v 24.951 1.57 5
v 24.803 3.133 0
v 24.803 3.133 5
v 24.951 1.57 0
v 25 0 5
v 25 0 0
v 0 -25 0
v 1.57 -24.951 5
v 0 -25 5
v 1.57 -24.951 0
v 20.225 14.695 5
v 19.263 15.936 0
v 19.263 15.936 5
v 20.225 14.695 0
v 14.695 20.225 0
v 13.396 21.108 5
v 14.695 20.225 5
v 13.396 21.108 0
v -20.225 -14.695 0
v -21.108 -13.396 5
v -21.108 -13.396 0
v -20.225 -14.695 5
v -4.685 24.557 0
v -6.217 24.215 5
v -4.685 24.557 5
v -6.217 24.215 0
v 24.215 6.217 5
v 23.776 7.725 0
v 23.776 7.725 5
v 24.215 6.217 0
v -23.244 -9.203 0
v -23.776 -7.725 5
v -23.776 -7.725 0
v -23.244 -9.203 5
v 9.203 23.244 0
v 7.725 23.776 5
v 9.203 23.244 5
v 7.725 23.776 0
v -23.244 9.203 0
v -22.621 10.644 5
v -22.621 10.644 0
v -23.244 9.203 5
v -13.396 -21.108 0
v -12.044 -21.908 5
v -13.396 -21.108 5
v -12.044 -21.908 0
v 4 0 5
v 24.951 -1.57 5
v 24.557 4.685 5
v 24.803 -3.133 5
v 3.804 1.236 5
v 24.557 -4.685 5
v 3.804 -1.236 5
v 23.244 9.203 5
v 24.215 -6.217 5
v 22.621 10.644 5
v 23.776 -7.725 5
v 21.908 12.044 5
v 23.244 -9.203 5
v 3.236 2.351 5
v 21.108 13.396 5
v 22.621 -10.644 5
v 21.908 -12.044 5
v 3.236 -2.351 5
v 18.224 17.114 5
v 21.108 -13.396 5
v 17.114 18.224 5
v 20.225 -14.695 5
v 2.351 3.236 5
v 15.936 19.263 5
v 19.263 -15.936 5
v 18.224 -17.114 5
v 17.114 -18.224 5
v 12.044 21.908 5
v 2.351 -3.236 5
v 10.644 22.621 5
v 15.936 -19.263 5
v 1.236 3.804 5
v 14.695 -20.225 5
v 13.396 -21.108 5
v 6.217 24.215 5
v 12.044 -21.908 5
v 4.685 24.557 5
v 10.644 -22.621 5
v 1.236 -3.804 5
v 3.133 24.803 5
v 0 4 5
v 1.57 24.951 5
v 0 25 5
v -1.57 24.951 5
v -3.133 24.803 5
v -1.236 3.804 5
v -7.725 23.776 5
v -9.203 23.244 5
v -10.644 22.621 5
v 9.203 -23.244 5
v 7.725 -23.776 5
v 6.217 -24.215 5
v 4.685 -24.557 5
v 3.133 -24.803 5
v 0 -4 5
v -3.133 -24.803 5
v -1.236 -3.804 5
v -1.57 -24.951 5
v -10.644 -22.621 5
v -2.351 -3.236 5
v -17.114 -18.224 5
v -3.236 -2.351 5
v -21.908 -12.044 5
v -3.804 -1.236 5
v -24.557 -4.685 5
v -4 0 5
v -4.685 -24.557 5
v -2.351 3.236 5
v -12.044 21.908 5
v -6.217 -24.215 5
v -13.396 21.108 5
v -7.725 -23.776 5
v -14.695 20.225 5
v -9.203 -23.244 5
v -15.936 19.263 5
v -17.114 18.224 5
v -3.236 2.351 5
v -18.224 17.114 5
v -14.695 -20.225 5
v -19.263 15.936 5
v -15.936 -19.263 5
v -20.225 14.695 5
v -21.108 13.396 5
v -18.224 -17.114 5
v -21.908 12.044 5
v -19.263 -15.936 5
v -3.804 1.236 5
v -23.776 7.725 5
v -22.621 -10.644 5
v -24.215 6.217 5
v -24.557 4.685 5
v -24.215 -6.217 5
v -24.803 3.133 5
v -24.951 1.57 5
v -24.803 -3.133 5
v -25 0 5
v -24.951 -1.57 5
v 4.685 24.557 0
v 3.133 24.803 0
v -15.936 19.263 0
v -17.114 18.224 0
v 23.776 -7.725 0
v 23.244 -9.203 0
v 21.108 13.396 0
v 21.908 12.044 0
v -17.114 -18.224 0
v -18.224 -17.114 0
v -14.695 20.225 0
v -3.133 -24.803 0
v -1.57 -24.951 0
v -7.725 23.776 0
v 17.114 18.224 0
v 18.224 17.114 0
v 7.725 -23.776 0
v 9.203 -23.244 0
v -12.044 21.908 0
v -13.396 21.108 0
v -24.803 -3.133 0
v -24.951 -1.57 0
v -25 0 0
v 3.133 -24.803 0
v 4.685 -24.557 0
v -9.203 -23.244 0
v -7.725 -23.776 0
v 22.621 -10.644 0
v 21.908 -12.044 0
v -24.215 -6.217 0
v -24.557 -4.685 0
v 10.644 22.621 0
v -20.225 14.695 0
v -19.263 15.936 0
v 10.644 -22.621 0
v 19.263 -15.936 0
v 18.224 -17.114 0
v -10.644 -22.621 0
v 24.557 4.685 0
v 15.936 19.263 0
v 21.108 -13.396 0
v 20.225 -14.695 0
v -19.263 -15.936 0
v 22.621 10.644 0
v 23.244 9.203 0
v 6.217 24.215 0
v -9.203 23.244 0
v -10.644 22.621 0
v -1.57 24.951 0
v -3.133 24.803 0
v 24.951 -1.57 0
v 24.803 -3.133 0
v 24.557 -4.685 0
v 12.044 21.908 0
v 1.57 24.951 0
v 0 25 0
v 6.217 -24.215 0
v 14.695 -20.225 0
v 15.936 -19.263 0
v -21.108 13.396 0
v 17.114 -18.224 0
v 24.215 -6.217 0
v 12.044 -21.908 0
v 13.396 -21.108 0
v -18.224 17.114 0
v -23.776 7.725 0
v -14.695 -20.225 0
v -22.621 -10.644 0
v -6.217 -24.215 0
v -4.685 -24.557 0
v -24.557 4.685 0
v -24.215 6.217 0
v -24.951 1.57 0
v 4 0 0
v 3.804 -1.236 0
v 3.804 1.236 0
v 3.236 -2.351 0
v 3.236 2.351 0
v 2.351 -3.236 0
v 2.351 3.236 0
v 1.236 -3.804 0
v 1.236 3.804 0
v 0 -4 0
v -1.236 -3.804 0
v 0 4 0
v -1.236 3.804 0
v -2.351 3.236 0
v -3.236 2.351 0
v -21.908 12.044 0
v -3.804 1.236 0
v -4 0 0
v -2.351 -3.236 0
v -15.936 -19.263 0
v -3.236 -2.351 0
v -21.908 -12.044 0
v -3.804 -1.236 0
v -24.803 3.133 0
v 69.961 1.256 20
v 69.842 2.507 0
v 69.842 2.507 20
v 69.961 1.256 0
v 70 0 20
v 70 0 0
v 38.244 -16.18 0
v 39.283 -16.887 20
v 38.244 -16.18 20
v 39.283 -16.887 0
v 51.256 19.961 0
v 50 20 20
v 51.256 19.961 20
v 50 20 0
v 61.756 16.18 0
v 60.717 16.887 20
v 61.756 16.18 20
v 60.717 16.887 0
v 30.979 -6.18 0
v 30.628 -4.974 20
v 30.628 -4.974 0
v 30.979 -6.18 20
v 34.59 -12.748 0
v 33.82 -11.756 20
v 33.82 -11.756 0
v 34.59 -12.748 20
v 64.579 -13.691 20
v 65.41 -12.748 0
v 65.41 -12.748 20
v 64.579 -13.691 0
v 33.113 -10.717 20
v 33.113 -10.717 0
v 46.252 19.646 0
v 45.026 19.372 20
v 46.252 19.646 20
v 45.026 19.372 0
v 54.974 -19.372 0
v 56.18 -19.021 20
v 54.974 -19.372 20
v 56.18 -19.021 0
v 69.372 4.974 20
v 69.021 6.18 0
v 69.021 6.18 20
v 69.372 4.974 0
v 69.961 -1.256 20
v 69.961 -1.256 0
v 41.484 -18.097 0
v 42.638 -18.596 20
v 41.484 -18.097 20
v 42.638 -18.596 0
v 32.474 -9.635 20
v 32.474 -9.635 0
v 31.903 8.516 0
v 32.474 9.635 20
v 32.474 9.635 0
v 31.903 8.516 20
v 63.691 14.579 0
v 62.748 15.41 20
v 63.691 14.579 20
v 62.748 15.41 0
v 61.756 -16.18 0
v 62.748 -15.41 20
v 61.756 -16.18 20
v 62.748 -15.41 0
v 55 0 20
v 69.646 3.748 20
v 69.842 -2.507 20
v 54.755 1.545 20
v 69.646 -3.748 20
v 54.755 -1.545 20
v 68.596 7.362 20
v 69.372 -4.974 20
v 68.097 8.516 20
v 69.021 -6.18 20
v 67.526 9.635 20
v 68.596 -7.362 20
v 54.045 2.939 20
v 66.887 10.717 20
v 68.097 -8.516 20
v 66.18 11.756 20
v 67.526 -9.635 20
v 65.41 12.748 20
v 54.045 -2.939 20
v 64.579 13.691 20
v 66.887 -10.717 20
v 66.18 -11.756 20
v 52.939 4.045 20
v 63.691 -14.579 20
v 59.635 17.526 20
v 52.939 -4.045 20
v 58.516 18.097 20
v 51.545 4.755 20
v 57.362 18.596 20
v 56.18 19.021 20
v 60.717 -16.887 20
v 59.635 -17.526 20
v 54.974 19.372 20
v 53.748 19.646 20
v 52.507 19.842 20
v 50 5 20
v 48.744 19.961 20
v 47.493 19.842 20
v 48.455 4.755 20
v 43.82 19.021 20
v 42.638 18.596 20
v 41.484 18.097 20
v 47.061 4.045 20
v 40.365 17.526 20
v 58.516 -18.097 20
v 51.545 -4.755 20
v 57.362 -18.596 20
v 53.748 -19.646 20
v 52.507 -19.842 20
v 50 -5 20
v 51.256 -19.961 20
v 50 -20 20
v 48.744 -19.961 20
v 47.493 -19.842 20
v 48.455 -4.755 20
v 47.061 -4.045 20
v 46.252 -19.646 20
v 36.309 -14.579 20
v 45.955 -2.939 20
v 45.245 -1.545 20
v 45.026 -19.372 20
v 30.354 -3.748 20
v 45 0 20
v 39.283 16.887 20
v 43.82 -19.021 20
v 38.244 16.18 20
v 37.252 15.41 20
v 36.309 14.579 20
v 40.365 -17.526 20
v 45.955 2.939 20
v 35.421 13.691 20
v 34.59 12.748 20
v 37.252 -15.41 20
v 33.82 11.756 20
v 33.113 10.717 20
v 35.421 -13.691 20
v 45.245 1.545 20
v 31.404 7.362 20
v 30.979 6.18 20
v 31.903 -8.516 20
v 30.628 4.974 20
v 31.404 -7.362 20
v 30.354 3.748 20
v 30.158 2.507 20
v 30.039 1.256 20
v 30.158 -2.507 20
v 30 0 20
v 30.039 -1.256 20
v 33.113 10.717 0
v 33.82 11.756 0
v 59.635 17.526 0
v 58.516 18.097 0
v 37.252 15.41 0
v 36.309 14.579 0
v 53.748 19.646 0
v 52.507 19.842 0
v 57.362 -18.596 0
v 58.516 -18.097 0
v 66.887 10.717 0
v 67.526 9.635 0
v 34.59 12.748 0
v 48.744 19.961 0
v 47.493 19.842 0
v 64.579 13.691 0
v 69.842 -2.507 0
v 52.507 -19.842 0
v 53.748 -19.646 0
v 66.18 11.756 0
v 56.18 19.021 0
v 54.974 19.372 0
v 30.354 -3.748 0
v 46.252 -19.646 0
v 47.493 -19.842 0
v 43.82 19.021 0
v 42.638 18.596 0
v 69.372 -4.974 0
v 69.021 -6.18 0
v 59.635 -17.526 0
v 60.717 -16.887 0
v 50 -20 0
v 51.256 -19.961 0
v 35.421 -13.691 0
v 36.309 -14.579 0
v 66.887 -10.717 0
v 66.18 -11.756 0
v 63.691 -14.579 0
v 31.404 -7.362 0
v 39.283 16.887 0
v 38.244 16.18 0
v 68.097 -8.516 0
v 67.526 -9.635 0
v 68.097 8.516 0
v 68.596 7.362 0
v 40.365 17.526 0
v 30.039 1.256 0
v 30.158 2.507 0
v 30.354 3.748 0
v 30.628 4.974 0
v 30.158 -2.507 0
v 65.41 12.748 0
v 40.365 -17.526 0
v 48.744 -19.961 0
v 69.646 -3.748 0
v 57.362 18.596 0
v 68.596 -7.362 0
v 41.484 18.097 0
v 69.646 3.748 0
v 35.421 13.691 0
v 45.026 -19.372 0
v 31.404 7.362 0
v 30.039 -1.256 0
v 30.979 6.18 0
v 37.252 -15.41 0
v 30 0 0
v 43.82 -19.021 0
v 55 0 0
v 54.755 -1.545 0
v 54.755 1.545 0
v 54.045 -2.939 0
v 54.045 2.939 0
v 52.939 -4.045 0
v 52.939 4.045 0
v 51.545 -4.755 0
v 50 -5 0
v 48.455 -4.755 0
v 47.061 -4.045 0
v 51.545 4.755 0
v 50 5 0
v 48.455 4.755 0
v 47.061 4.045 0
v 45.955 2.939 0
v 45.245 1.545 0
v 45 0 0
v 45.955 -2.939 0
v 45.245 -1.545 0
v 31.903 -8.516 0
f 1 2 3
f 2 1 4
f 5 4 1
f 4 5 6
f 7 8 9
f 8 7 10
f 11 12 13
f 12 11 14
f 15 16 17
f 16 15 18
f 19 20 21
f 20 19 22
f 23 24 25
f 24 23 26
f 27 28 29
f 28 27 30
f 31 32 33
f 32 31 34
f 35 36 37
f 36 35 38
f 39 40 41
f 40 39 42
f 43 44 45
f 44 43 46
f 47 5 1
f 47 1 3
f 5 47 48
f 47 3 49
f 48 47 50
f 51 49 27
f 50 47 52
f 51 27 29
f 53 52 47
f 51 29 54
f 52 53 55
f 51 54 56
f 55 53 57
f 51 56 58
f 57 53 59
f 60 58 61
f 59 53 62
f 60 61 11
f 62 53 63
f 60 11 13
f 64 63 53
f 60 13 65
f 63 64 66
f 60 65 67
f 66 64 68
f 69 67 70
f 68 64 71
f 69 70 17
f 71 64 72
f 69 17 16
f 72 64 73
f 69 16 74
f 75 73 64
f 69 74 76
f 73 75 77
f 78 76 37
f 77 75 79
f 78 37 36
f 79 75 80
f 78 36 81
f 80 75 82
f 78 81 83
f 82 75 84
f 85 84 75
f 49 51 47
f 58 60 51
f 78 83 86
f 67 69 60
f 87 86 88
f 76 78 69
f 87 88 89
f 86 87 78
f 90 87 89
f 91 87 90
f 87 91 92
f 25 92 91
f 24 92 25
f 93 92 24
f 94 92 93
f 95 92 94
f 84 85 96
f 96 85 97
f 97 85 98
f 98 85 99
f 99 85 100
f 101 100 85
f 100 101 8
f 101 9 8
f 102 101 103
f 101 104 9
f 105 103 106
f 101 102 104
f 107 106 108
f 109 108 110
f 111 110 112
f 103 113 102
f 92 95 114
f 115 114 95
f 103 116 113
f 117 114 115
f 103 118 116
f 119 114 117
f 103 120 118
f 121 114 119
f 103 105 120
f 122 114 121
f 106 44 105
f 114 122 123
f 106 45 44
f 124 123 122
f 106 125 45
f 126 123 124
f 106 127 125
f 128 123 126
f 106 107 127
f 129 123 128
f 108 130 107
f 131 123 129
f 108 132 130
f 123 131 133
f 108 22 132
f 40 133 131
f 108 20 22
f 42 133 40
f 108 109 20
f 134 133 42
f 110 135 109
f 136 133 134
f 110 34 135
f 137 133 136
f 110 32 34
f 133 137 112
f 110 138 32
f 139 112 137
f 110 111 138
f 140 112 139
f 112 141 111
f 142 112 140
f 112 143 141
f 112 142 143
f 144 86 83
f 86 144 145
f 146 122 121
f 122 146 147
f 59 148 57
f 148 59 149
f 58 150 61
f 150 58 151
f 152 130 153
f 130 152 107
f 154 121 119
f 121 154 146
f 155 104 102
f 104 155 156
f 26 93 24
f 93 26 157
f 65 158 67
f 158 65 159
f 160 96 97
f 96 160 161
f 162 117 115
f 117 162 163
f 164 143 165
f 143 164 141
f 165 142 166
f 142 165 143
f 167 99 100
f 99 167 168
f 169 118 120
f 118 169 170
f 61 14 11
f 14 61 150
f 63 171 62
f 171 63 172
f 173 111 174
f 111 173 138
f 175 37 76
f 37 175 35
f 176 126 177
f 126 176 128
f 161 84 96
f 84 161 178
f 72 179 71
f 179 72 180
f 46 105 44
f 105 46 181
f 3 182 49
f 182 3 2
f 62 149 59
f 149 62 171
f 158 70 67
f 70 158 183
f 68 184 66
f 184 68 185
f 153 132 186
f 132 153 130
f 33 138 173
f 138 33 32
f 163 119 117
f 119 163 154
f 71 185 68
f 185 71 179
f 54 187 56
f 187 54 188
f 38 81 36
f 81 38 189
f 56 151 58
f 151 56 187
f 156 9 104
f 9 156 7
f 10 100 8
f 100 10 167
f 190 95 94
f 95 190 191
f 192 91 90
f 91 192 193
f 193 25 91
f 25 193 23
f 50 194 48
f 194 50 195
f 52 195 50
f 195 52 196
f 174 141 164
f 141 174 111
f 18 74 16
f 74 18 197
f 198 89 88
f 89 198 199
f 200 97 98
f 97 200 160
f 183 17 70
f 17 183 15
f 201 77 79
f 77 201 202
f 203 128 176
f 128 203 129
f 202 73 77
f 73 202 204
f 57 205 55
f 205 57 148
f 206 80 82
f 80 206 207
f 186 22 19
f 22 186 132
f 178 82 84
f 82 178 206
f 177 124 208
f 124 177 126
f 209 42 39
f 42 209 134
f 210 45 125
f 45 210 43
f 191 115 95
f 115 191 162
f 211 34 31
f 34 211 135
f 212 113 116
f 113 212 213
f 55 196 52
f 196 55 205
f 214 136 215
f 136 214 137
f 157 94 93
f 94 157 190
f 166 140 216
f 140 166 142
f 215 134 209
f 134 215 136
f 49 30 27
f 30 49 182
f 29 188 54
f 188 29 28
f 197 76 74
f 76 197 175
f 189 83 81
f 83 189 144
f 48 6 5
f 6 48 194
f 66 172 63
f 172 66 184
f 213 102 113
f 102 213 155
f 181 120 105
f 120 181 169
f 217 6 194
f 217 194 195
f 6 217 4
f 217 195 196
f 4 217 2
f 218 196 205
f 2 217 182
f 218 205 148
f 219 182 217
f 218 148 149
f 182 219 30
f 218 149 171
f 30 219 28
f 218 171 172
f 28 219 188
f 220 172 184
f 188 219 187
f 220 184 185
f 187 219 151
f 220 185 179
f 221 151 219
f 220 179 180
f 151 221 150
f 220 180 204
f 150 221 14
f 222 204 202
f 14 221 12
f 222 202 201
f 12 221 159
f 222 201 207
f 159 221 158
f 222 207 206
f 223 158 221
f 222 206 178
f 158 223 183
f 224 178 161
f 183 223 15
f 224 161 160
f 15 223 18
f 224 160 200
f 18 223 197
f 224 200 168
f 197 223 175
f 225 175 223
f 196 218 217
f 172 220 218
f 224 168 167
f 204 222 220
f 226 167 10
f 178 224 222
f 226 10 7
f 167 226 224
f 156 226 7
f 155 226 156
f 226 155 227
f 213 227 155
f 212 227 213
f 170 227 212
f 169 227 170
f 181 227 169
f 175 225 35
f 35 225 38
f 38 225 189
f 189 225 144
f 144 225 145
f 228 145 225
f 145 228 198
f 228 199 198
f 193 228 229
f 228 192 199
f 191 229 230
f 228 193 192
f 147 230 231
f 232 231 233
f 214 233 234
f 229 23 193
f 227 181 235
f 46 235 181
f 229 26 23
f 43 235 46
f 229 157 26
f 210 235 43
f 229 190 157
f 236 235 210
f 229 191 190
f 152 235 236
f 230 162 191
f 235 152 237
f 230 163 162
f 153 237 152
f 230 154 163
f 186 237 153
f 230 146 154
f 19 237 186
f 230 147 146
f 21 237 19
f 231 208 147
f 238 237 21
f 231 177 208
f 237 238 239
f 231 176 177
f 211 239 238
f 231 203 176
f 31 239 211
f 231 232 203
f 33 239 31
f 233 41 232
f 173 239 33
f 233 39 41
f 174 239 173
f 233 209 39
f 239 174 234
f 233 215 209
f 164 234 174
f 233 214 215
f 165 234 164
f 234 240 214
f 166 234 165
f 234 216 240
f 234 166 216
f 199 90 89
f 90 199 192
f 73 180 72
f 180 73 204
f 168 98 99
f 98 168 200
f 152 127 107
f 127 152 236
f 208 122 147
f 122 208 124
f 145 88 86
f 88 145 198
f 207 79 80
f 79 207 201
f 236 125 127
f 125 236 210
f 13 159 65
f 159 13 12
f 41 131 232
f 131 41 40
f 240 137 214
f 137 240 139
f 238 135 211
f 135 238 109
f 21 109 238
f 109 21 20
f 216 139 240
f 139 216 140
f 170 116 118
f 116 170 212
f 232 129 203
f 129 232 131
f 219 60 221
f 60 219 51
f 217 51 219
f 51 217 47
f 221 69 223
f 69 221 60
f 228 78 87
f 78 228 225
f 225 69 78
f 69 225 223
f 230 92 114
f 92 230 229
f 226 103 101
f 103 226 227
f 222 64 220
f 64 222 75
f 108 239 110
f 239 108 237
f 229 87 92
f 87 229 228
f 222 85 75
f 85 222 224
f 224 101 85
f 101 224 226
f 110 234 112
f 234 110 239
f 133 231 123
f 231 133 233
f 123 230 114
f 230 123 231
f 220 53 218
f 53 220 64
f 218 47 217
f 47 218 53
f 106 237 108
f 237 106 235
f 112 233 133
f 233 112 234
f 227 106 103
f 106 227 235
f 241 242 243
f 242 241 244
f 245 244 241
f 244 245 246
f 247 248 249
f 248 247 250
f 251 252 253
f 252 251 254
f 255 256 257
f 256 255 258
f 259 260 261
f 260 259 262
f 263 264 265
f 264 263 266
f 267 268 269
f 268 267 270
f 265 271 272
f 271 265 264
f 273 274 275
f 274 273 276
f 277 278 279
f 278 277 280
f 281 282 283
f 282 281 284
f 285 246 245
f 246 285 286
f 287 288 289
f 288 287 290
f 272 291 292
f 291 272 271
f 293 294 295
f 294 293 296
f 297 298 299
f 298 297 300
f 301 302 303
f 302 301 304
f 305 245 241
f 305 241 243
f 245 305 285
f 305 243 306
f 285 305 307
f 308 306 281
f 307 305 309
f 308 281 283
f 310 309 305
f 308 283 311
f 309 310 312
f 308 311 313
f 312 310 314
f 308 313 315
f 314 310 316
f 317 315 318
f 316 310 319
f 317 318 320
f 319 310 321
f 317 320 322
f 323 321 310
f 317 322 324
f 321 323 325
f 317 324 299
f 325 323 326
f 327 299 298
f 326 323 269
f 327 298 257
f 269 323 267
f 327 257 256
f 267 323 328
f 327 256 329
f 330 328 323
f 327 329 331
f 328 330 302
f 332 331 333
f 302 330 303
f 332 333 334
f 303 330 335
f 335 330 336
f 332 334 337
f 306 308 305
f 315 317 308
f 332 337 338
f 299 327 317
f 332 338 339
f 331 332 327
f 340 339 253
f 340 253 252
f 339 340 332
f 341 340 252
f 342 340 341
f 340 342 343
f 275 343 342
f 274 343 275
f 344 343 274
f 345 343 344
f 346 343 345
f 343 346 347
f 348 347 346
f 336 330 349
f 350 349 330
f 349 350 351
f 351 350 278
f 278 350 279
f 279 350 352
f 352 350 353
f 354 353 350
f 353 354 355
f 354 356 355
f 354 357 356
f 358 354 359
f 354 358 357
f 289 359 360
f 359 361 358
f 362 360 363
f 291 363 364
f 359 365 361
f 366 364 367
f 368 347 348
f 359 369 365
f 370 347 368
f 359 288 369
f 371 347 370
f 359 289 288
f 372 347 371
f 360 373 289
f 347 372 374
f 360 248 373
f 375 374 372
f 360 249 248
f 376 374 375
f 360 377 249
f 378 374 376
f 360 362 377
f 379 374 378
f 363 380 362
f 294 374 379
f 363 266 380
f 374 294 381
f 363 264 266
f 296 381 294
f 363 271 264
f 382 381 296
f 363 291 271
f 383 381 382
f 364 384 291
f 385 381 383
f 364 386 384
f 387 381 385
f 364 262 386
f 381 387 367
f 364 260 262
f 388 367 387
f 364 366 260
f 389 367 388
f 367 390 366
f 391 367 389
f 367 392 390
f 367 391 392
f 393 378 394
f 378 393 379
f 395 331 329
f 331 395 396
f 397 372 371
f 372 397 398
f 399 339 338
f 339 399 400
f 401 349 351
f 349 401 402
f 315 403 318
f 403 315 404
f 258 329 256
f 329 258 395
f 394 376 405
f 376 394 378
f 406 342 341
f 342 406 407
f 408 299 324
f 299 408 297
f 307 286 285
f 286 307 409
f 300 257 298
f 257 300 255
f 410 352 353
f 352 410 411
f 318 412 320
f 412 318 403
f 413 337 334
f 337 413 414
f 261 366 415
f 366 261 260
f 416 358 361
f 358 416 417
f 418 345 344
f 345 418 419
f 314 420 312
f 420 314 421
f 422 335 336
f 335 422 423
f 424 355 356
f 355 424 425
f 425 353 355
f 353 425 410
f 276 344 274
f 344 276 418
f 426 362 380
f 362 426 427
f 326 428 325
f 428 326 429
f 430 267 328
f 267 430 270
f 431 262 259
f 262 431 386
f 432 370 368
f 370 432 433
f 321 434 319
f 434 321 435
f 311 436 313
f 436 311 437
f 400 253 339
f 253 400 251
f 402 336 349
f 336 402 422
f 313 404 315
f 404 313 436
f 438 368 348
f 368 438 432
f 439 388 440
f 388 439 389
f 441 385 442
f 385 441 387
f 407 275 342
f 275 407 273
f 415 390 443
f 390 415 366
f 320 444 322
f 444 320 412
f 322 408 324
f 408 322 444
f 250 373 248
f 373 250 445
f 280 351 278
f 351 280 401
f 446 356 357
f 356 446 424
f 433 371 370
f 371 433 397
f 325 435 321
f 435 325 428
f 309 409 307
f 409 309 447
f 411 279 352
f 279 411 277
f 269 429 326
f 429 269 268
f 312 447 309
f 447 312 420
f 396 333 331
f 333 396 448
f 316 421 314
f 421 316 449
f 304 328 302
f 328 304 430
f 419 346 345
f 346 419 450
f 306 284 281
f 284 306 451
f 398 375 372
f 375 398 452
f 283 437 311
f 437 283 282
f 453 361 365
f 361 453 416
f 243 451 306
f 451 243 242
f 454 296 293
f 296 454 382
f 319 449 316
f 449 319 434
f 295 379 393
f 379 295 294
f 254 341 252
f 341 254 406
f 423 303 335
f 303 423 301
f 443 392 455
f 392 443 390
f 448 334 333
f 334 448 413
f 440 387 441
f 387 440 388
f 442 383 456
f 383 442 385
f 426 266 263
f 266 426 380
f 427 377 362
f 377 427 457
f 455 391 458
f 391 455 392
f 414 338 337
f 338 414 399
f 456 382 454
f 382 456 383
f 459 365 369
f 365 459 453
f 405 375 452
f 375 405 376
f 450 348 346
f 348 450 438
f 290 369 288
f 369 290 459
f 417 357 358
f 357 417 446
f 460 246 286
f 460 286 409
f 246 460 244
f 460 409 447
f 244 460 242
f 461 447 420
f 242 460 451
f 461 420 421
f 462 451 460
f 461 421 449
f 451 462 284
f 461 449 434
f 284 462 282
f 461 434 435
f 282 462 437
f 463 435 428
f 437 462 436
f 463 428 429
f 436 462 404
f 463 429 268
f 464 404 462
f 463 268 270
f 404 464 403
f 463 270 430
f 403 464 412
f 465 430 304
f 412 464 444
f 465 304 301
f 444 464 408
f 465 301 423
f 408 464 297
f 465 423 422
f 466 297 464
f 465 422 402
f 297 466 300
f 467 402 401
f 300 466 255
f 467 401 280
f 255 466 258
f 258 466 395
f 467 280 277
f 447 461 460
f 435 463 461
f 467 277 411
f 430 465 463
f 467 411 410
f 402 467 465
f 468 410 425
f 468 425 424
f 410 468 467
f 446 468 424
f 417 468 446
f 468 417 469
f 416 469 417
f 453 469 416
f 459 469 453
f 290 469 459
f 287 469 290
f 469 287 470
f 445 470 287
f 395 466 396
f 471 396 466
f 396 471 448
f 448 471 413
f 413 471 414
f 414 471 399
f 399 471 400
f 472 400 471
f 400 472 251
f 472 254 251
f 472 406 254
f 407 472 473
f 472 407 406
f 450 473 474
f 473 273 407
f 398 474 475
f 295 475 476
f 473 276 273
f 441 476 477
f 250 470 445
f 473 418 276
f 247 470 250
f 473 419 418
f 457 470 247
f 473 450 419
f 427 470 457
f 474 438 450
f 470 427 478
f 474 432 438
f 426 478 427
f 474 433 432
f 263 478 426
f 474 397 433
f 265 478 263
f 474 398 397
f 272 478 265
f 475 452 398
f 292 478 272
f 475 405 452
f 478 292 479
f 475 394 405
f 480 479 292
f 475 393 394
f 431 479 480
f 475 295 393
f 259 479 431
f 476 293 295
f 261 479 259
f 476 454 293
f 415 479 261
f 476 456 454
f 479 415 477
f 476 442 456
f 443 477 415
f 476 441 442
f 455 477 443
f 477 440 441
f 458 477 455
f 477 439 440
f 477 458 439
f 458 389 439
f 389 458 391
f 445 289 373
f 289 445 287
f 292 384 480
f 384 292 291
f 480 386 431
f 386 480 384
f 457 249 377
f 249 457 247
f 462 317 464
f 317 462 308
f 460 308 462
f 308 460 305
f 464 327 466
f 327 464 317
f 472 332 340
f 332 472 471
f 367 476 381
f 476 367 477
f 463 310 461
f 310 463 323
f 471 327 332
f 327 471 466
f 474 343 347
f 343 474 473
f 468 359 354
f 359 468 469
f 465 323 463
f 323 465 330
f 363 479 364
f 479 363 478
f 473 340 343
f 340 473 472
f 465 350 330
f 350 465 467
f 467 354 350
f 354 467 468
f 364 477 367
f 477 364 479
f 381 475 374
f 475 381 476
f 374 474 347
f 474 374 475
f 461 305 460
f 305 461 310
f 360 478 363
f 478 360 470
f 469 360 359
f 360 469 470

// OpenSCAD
module rueda_simple(grsor, diametro, diam_eje){

    //-- Construcción rueda simple a partir de parametros
    difference(){
        //-- Base de la rueda
        cylinder(r=diametro/2, h=grosor, $fn=100);
    
        //--Taladro de 8mm
        cylinder(r=diam_eje/2, h=3*grosor, $fn=20, center=true);
    }
}

rueda_simple(diametro=50, grosor=5,diam_eje=8);

translate([50,0,0])
rueda_simple(diametro=40, grosor=20,diam_eje=10);
